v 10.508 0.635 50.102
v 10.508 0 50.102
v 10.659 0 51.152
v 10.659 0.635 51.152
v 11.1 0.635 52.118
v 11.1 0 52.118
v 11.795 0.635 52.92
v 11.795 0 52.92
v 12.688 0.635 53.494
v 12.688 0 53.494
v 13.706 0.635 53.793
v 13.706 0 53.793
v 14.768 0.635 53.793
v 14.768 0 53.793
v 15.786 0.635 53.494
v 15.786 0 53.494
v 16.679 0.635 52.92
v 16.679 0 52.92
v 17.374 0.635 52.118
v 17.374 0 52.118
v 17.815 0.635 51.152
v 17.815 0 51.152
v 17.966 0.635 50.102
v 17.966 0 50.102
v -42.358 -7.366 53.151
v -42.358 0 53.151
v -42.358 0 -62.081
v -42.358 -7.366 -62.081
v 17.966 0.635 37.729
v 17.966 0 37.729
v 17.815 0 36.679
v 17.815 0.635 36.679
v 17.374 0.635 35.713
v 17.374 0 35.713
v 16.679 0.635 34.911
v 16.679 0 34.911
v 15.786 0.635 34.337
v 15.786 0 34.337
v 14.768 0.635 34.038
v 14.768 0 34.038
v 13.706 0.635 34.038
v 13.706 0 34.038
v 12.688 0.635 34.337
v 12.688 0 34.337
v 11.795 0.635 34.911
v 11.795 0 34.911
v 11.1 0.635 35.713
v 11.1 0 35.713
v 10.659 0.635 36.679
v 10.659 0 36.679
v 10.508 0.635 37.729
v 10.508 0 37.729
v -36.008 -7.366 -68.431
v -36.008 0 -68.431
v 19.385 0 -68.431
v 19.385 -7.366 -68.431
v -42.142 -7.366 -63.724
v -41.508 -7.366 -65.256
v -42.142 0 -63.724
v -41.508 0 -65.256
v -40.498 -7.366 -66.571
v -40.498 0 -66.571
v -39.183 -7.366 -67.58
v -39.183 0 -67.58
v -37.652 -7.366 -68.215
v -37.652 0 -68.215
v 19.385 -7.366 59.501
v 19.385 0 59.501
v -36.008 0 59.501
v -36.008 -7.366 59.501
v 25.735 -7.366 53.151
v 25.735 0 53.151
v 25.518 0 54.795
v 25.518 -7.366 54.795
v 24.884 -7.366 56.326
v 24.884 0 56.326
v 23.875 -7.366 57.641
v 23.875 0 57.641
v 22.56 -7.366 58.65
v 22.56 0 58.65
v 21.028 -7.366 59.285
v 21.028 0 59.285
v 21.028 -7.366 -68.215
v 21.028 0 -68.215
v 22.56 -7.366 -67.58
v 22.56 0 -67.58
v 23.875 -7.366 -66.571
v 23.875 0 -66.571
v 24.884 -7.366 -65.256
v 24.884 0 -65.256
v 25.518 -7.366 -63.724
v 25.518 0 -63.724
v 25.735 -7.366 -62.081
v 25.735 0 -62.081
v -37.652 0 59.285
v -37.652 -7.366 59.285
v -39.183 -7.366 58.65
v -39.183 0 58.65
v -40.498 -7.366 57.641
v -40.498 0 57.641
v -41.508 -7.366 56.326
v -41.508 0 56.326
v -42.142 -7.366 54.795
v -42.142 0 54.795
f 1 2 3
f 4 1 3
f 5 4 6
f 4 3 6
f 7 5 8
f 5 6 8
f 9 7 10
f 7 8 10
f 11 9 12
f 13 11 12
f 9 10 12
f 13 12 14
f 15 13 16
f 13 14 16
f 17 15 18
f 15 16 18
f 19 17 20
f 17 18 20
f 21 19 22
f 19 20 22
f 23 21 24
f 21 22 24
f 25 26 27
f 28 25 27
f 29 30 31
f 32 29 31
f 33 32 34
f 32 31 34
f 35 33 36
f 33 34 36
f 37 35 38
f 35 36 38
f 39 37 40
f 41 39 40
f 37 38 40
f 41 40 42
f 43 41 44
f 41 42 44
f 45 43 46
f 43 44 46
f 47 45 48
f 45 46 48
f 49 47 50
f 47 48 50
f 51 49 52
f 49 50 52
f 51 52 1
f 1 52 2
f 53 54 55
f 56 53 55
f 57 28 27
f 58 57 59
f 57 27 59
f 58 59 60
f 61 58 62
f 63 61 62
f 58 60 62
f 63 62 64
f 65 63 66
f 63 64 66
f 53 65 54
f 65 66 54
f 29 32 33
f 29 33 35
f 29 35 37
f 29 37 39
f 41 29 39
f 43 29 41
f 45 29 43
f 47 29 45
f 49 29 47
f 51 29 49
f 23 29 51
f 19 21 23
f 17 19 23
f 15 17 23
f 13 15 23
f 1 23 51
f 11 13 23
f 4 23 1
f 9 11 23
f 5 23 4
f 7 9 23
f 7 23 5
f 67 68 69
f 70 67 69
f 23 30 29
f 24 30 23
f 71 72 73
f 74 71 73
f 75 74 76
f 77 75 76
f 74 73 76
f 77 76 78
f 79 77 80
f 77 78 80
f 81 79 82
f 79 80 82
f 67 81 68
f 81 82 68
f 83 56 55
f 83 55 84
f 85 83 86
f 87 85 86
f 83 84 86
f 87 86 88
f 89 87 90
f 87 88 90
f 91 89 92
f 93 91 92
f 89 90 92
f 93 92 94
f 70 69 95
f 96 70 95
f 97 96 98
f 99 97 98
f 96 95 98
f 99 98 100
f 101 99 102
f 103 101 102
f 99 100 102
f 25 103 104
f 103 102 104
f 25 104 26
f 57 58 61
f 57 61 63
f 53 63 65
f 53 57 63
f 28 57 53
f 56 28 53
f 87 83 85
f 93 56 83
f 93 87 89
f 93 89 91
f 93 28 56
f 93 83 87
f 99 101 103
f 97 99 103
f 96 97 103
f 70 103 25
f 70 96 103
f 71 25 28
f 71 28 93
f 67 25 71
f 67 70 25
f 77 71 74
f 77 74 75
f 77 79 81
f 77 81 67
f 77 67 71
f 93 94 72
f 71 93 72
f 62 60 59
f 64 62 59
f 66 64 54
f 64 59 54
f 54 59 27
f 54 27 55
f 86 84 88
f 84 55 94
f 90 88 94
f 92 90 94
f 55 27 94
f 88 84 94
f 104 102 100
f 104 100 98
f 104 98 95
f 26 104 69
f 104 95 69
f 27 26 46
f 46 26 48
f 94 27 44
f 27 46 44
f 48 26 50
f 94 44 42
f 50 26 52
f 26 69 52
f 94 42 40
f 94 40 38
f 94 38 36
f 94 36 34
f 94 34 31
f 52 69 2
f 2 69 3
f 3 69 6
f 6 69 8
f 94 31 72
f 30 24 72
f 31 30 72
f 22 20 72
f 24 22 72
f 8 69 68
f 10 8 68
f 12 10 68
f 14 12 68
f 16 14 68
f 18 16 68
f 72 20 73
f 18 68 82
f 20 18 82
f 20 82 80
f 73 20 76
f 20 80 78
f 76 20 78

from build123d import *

# Parameters (mm, degrees)
F2_DEPTH = 7.366
F3_W     = 7.4584446847
F3_H     = 12.3723968863
F4_DEPTH = 0.635
F6_DEPTH = 0.635
F7_R     = 1.3168928059
F8_DEPTH = 1.27


with BuildPart() as f2:
    # F1 (on face) → F2 (new body)
    with BuildSketch(Plane.XZ):
        with BuildLine():
            ThreePointArc((25.7346183062, 53.1512381673), (23.8747463667, 57.6413662278), (19.3846183062, 59.5012381673))
            Line((19.3846183062, 59.5012381673), (-36.008353734, 59.5012381673))
            ThreePointArc((-36.008353734, 59.5012381673), (-40.4984817946, 57.6413662278), (-42.358353734, 53.1512381673))
            Line((-42.358353734, 53.1512381673), (-42.358353734, -62.0809899807))
            ThreePointArc((-42.358353734, -62.0809899807), (-40.4984817946, -66.5711180412), (-36.008353734, -68.4309899807))
            Line((-36.008353734, -68.4309899807), (19.3846183062, -68.4309899807))
            ThreePointArc((19.3846183062, -68.4309899807), (23.8747463667, -66.5711180412), (25.7346183062, -62.0809899807))
            Line((25.7346183062, -62.0809899807), (25.7346183062, 53.1512381673))
        make_face()
    extrude(amount=F2_DEPTH)

    # F3 (on face) → F4 (join)
    with BuildSketch(Plane(origin=(0, 0, 0), x_dir=(-1, 0, 0), z_dir=(0, 1, 0))):
        with Locations((-14.2369214445, 43.9156256616)):
            Rectangle(F3_W, F3_H)
    extrude(amount=F4_DEPTH)

    # F5 (on face) → F6 (join)
    with BuildSketch(Plane(origin=(0, 0, 0), x_dir=(-1, 0, 0), z_dir=(0, 1, 0))):
        with BuildLine():
            ThreePointArc((-17.9661437869, 37.7294272184), (-14.2369214445, 34.0002048761), (-10.5076991022, 37.7294272184))
            Line((-10.5076991022, 37.7294272184), (-17.9661437869, 37.7294272184))
        make_face()
        with BuildLine():
            Line((-17.9661437869, 50.1018241048), (-10.5076991022, 50.1018241048))
            ThreePointArc((-10.5076991022, 50.1018241048), (-14.2369214445, 53.8310464472), (-17.9661437869, 50.1018241048))
        make_face()
    extrude(amount=F6_DEPTH)

    # F7 (on face) → F8 (join)
    with BuildSketch(Plane(origin=(0, 0, 0), x_dir=(-1, 0, 0), z_dir=(0, 1, 0))):
        with BuildLine():
            ThreePointArc((-19.3846183062, 59.5012381673), (-23.8747463667, 57.6413662278), (-25.7346183062, 53.1512381673))
            Line((-25.7346183062, 53.1512381673), (-25.7346183062, -62.0809899807))
            ThreePointArc((-25.7346183062, -62.0809899807), (-23.8747463667, -66.5711180412), (-19.3846183062, -68.4309899807))
            Line((-19.3846183062, -68.4309899807), (36.008353734, -68.4309899807))
            ThreePointArc((36.008353734, -68.4309899807), (40.4984817946, -66.5711180412), (42.358353734, -62.0809899807))
            Line((42.358353734, -62.0809899807), (42.358353734, 53.1512381673))
            ThreePointArc((42.358353734, 53.1512381673), (40.4984817946, 57.6413662278), (36.008353734, 59.5012381673))
            Line((36.008353734, 59.5012381673), (-19.3846183062, 59.5012381673))
        make_face()
        with BuildLine():
            Line((-10.5076991022, 50.1018241048), (-10.5076991022, 37.7294272184))
            ThreePointArc((-10.5076991022, 37.7294272184), (-14.2369214445, 34.0002048761), (-17.9661437869, 37.7294272184))
            Line((-17.9661437869, 37.7294272184), (-17.9661437869, 50.1018241048))
            ThreePointArc((-17.9661437869, 50.1018241048), (-14.2369214445, 53.8310464472), (-10.5076991022, 50.1018241048))
        make_face(mode=Mode.SUBTRACT)
        with Locations((-6.3106212765, 47.3092123866)):
            Circle(F7_R, mode=Mode.SUBTRACT)
        with Locations((-6.3106212765, 47.3092123866)):
            Circle(F7_R)
    extrude(amount=-F8_DEPTH)


solid = f2.part
